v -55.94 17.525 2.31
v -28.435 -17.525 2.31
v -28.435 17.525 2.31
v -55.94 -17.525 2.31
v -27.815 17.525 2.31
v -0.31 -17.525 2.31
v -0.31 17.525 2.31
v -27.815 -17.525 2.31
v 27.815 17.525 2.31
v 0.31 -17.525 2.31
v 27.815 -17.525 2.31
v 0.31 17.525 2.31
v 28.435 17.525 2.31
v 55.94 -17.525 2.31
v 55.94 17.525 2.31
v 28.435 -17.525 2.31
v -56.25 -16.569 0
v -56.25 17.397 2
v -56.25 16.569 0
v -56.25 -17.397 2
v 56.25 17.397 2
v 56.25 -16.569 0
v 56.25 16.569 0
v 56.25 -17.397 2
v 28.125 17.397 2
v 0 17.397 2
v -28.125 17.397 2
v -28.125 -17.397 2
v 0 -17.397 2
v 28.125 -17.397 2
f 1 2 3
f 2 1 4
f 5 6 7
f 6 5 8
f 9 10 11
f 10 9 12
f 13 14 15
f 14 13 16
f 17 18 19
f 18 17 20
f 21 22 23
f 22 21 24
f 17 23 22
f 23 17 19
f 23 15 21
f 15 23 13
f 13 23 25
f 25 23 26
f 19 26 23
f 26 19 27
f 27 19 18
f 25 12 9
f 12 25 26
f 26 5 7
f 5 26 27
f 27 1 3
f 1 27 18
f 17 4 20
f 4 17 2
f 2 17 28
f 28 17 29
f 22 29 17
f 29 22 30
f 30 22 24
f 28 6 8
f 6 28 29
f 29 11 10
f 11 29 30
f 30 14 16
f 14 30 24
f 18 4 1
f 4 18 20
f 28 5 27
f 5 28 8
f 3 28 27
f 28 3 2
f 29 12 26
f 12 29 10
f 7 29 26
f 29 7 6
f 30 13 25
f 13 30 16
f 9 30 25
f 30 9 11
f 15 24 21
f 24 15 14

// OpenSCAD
// file: ../lib/project/cache_pot_geometry.scad
// Shared paneled cache pot geometry helpers.

function cache_pot_outside_height(inside_height, bottom_thickness) =
  inside_height + bottom_thickness;

function cache_pot_outside_radius(inside_radius, min_wall_thickness, num_panels) =
  (inside_radius + min_wall_thickness) / cos(180 / num_panels);

function cache_pot_panel_extra_radius(panel_thickness, num_panels) =
  panel_thickness / cos(180 / num_panels);

function cache_pot_panel_width(outside_radius, panel_thickness, num_panels) =
  (outside_radius + cache_pot_panel_extra_radius(panel_thickness, num_panels)) *
  2 * sin(180 / num_panels);

module cache_pot_outside_cylinder(outside_height, outside_radius, num_panels) {
  cylinder(outside_height, outside_radius, outside_radius, $fn = num_panels);
}

module cache_pot_inside_cutout(
  inside_height,
  inside_radius,
  bottom_thickness,
  bottom_edge_width
) {
  translate([0, 0, bottom_thickness])
    cylinder(inside_height + 1, inside_radius, inside_radius);
  translate([0, 0, -0.5 * bottom_thickness])
    cylinder(
      2 * bottom_thickness,
      inside_radius - bottom_edge_width,
      inside_radius - bottom_edge_width
    );
}

module cache_pot_core(
  inside_height,
  inside_radius,
  bottom_thickness,
  bottom_edge_width,
  outside_height,
  outside_radius,
  num_panels
) {
  difference() {
    cache_pot_outside_cylinder(outside_height, outside_radius, num_panels);
    cache_pot_inside_cutout(
      inside_height,
      inside_radius,
      bottom_thickness,
      bottom_edge_width
    );
  }
}

module cache_pot_panel_shell(
  outside_height,
  outside_radius,
  panel_thickness,
  num_panels
) {
  difference() {
    cylinder(
      outside_height,
      outside_radius + panel_thickness,
      outside_radius + panel_thickness,
      $fn = num_panels
    );
    translate([0, 0, -1])
      cylinder(outside_height + 2, outside_radius, outside_radius, $fn = num_panels);
    translate([-(outside_radius + panel_thickness + 1), 0, -1])
      cube([
        2 * (outside_radius + panel_thickness + 1),
        2 * (outside_radius + panel_thickness + 1),
        outside_height + 2
      ]);
    rotate([0, 0, 180 - 360 / num_panels])
      translate([-(outside_radius + panel_thickness + 1), 0, -1])
        cube([
          2 * (outside_radius + panel_thickness + 1),
          2 * (outside_radius + panel_thickness + 1),
          outside_height + 2
        ]);
  }
}

module cache_pot_panel_flat_on_bed(
  inside_radius,
  min_wall_thickness,
  outside_height,
  num_panels,
  outside_radius,
  panel_thickness
) {
  translate([outside_height / 2, 0, -(inside_radius + min_wall_thickness)])
    rotate([0, -90, 0])
      rotate([0, 0, 180 / num_panels])
        cache_pot_panel_shell(
          outside_height = outside_height,
          outside_radius = outside_radius,
          panel_thickness = panel_thickness,
          num_panels = num_panels
        );
}
// main file
// Paneled cache pot checkered panel.

use <../lib/project/cache_pot_geometry.scad>;

// ---------- Public parameters (mm) ----------
inside_radius = 75 / 2;
inside_height = 110;
min_wall_thickness = 2.5;
bottom_thickness = 2.5;
bottom_edge_width = 10;
num_panels = 8;
panel_thickness = 2.5;
groove_depth = 0.5;

// ---------- Resolution ----------
$fa = 1;
$fs = 1;

// ---------- Derived ----------
outside_height = cache_pot_outside_height(inside_height, bottom_thickness);
outside_radius = cache_pot_outside_radius(inside_radius, min_wall_thickness, num_panels);

module panel_groove() {
    translate([0, 0, sqrt(2 * outside_radius * outside_radius) / 2 + panel_thickness - groove_depth]) rotate([0, 45, 0]) cube(outside_radius, center=true);
}

module grooved_panel() {
    difference() {
        cache_pot_panel_flat_on_bed(
          inside_radius = inside_radius,
          min_wall_thickness = min_wall_thickness,
          outside_height = outside_height,
          num_panels = num_panels,
          outside_radius = outside_radius,
          panel_thickness = panel_thickness
        );
        translate([-outside_height / 2, 0, 0]) panel_groove();
        translate([-outside_height / 4, 0, 0]) panel_groove();
        panel_groove();
        translate([outside_height / 4, 0, 0]) panel_groove();
        translate([outside_height / 2, 0, 0]) panel_groove();
    }
}

grooved_panel();
//color("red") panel();
//color("yellow") core();
